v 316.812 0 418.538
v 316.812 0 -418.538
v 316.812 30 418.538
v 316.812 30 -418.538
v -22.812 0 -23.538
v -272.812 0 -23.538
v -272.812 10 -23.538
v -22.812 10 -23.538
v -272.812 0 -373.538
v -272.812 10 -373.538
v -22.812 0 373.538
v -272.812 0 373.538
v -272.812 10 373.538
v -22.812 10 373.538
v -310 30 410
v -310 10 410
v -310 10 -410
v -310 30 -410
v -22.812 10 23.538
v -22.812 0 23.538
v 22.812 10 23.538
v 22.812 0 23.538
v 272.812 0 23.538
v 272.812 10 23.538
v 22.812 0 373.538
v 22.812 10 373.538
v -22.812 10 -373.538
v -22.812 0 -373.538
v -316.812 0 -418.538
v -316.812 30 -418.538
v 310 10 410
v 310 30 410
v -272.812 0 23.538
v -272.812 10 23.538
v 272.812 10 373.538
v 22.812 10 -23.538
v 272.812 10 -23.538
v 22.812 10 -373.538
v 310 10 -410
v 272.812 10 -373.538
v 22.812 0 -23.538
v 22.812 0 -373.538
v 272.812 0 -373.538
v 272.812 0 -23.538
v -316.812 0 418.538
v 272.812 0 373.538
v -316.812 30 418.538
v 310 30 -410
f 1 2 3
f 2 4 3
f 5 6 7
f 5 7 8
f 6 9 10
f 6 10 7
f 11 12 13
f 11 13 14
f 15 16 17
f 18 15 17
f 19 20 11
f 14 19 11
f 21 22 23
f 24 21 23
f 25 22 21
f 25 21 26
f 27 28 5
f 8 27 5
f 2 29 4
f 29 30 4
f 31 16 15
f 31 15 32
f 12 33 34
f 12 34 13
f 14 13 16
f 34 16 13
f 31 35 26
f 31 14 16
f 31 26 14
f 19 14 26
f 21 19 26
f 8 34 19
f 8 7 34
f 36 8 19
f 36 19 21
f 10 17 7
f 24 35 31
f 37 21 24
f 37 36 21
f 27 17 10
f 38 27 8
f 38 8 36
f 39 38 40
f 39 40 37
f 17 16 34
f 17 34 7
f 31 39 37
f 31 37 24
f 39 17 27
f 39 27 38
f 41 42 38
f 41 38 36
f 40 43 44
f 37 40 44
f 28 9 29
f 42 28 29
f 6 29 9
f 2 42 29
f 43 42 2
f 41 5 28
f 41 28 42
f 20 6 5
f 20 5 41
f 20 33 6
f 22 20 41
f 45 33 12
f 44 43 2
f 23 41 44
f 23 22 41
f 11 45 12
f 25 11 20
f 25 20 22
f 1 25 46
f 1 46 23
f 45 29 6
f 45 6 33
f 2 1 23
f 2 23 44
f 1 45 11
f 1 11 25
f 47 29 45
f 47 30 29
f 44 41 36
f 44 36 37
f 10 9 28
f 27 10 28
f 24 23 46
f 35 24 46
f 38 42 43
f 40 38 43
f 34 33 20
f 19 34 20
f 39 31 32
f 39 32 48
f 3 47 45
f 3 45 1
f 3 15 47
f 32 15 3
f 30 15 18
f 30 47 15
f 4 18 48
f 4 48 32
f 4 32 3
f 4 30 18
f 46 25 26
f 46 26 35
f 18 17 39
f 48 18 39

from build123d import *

# Parameters (mm, degrees)
CROQUIS1_W              = 620
CROQUIS1_H              = 820
SALIENTE_EXTRUIR1_DEPTH = 10
CROQUIS2_W              = 633.624968344
CROQUIS2_H              = 837.075812624
CROQUIS2_W_2            = 620
CROQUIS2_H_2            = 820
SALIENTE_EXTRUIR2_DEPTH = 20
CROQUIS3_W              = 633.624968344
CROQUIS3_H              = 837.075812624
SALIENTE_EXTRUIR3_DEPTH = 10
CROQUIS4_W              = 250
CROQUIS4_H              = 350
CORTAR_EXTRUIR1_DEPTH   = 10


with BuildPart() as part:
    # Croquis1 → Saliente-Extruir1 (new body)
    with BuildSketch(Plane(origin=(0, 0, 0), x_dir=(1, 0, 0), z_dir=(0, 1, 0))):
        Rectangle(CROQUIS1_W, CROQUIS1_H)
    extrude(amount=SALIENTE_EXTRUIR1_DEPTH)



with BuildPart() as body_2:
    # Croquis2 → Saliente-Extruir2 (new body)
    with BuildSketch(Plane(origin=(0, 10, 0), x_dir=(1, 0, 0), z_dir=(0, 1, 0))):
        Rectangle(CROQUIS2_W, CROQUIS2_H)
        Rectangle(CROQUIS2_W_2, CROQUIS2_H_2, mode=Mode.SUBTRACT)
    extrude(amount=SALIENTE_EXTRUIR2_DEPTH)


with BuildPart() as part_1:
    add(part.part)

    add(body_2.part)  # Saliente-Extruir3 merges body 2
    # Croquis3 → Saliente-Extruir3 (add)
    with BuildSketch(Plane.XZ.offset(-10)):
        Rectangle(CROQUIS3_W, CROQUIS3_H)
    extrude(amount=SALIENTE_EXTRUIR3_DEPTH)

    # Croquis4 → Cortar-Extruir1 (cut)
    with BuildSketch(Plane.XZ):
        with Locations((-147.812484172, 198.537906312)):
            Rectangle(CROQUIS4_W, CROQUIS4_H)
        with Locations((147.812484172, 198.537906312)):
            Rectangle(CROQUIS4_W, CROQUIS4_H)
        with Locations((-147.812484172, -198.537906312)):
            Rectangle(CROQUIS4_W, CROQUIS4_H)
        with Locations((147.812484172, -198.537906312)):
            Rectangle(CROQUIS4_W, CROQUIS4_H)
    extrude(amount=-CORTAR_EXTRUIR1_DEPTH, mode=Mode.SUBTRACT)


solid = part_1.part
